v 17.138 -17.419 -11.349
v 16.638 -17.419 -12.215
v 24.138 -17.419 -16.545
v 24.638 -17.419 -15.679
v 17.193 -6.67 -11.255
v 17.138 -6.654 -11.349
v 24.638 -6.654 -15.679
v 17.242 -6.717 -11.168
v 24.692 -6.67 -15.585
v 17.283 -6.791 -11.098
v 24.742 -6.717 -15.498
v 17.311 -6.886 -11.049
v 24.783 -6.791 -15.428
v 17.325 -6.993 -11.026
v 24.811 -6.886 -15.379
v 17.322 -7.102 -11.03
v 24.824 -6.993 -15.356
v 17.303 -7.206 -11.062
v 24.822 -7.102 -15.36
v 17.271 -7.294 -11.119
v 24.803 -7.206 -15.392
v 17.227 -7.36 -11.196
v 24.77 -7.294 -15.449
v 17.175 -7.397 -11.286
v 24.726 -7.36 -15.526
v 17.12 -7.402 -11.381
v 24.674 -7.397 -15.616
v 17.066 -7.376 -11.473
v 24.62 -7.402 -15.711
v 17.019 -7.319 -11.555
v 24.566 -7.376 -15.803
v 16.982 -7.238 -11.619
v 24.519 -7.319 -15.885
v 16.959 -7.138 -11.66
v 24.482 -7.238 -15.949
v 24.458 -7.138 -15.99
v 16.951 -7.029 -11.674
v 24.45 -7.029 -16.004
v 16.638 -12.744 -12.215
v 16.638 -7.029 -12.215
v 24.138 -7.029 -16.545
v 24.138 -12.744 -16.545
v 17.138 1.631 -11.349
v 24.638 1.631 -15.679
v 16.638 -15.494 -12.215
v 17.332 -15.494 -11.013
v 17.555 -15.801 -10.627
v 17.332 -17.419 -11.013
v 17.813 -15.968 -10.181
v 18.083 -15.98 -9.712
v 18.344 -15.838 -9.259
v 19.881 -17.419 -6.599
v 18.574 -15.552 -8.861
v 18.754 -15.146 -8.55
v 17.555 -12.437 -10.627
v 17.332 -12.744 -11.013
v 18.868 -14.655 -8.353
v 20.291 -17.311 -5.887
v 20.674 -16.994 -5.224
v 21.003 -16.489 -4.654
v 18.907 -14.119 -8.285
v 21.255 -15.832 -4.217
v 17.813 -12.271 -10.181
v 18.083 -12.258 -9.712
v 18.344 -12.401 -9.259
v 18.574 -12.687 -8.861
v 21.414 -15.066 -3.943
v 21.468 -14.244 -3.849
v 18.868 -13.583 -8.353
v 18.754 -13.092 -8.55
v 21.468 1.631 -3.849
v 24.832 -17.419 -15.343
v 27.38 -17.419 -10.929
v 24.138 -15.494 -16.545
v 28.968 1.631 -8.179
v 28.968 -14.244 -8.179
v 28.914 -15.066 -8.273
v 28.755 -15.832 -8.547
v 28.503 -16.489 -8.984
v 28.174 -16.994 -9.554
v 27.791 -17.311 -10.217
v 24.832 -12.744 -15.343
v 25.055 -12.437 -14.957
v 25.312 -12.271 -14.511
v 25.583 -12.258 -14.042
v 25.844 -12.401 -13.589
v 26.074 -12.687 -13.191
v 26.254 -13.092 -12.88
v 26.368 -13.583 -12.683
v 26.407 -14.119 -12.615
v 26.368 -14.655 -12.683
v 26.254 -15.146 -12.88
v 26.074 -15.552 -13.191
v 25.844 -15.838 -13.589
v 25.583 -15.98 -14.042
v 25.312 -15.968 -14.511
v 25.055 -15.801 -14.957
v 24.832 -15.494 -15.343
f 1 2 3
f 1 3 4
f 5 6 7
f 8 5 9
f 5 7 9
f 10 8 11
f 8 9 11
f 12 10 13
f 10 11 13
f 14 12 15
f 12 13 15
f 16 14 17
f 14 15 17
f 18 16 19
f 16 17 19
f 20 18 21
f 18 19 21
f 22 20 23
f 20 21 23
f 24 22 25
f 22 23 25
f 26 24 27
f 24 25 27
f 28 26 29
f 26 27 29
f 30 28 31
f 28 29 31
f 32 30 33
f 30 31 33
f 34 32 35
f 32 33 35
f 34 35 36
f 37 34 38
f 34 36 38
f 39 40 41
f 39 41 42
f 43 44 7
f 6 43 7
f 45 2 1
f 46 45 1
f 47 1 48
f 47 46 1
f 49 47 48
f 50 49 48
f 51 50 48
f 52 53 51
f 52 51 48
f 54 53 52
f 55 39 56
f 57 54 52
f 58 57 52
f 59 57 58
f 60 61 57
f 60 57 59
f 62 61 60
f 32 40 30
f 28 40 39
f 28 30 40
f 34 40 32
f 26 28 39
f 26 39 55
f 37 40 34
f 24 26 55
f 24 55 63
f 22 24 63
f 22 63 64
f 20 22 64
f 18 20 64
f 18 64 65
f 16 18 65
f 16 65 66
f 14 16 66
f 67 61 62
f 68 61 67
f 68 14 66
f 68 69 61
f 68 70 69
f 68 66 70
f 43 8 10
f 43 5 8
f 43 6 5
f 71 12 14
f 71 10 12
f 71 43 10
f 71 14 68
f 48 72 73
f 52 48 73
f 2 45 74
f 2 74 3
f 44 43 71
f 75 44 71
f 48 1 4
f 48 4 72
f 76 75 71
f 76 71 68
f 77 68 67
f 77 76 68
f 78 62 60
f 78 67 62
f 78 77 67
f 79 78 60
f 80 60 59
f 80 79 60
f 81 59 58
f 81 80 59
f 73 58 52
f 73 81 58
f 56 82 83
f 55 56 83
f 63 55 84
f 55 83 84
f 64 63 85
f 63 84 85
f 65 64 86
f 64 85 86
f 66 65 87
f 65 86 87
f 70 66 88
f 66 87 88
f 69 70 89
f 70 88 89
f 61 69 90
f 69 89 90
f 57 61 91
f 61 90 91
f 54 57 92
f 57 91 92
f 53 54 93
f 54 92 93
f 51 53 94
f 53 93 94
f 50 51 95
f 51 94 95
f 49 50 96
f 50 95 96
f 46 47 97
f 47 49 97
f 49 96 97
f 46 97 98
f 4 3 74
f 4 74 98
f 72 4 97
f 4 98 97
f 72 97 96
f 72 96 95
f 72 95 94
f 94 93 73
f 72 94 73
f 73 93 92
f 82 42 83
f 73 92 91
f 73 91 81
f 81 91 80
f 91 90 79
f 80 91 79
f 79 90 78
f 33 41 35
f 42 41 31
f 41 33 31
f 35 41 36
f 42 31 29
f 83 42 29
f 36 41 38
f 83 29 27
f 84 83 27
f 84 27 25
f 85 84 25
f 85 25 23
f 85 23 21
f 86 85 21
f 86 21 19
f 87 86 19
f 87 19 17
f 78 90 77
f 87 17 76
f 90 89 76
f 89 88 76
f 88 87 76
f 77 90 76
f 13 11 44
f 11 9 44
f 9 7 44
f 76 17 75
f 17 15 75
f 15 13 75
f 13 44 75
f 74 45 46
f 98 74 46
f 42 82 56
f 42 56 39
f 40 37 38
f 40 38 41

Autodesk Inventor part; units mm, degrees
ref_plane "YZ Plane" through (0, 0, 0) normal (1, 0, 0) x (0, 1, 0)
ref_plane "XZ Plane" through (0, 0, 0) normal (0, 1, 0) x (-1, 0, 0)
ref_plane "Work Plane1" through (25.296, -13.8947, -14.539) normal (-0.866, 0, 0.5) x (0.5, 0, 0.866)
sketch "Sketch1" plane through (25.296, -13.8947, -14.539) normal (-0.866, 0, 0.5) x (0.5, 0, 0.866)
  line L0 (-1.3162, -3.5246) -> (4.1688, -3.5246)
  arc A0 (-0.9285, -1.5996) -> (-0.9285, 1.1504) centre (0.3463, -0.2246) ccw
  line L1 (-0.9285, 1.1504) -> (-2.3162, 1.1504)
  line L2 (-2.3162, -1.5996) -> (-0.9285, -1.5996)
  line L3 (-1.3162, 15.5254) -> (-1.3162, 7.2404)
  line L4 (7.3438, 15.5254) -> (7.3438, -0.3496)
  arc A1 (4.1688, -3.5246) -> (7.3438, -0.3496) centre (4.1688, -0.3496) ccw
  line L5 (-1.3162, 15.5254) -> (7.3438, 15.5254)
  line L6 (-1.6912, 6.8654) -> (-2.3162, 6.8654)
  line L7 (-2.3162, -3.5246) -> (-0.9285, -3.5246)
  line L8 (-2.3162, 6.8654) -> (-2.3162, 1.1504)
  line L9 (-2.3162, -1.5996) -> (-2.3162, -3.5246)
  arc A2 (-1.6912, 6.8654) -> (-1.3162, 7.2404) centre (-1.3162, 6.8654) ccw
  point P0 (-1.3162, -1.5996)
  point P1 (-1.3162, 1.1504)
  dimension "d2" = 3.175
  dimension "d9" = 8.66
  dimension "d10" = 19.05
  dimension "d12" = 15.75
  dimension "d13" = 1.875
  dimension "d14" = 1.375
  dimension "d15" = 1.375
  dimension "d16" = 0.75
  dimension "d17" = 1
extrude "Extrusion1" add sketch "Sketch1" along normal blind 8.66
properties part number "Servo_Mount"
